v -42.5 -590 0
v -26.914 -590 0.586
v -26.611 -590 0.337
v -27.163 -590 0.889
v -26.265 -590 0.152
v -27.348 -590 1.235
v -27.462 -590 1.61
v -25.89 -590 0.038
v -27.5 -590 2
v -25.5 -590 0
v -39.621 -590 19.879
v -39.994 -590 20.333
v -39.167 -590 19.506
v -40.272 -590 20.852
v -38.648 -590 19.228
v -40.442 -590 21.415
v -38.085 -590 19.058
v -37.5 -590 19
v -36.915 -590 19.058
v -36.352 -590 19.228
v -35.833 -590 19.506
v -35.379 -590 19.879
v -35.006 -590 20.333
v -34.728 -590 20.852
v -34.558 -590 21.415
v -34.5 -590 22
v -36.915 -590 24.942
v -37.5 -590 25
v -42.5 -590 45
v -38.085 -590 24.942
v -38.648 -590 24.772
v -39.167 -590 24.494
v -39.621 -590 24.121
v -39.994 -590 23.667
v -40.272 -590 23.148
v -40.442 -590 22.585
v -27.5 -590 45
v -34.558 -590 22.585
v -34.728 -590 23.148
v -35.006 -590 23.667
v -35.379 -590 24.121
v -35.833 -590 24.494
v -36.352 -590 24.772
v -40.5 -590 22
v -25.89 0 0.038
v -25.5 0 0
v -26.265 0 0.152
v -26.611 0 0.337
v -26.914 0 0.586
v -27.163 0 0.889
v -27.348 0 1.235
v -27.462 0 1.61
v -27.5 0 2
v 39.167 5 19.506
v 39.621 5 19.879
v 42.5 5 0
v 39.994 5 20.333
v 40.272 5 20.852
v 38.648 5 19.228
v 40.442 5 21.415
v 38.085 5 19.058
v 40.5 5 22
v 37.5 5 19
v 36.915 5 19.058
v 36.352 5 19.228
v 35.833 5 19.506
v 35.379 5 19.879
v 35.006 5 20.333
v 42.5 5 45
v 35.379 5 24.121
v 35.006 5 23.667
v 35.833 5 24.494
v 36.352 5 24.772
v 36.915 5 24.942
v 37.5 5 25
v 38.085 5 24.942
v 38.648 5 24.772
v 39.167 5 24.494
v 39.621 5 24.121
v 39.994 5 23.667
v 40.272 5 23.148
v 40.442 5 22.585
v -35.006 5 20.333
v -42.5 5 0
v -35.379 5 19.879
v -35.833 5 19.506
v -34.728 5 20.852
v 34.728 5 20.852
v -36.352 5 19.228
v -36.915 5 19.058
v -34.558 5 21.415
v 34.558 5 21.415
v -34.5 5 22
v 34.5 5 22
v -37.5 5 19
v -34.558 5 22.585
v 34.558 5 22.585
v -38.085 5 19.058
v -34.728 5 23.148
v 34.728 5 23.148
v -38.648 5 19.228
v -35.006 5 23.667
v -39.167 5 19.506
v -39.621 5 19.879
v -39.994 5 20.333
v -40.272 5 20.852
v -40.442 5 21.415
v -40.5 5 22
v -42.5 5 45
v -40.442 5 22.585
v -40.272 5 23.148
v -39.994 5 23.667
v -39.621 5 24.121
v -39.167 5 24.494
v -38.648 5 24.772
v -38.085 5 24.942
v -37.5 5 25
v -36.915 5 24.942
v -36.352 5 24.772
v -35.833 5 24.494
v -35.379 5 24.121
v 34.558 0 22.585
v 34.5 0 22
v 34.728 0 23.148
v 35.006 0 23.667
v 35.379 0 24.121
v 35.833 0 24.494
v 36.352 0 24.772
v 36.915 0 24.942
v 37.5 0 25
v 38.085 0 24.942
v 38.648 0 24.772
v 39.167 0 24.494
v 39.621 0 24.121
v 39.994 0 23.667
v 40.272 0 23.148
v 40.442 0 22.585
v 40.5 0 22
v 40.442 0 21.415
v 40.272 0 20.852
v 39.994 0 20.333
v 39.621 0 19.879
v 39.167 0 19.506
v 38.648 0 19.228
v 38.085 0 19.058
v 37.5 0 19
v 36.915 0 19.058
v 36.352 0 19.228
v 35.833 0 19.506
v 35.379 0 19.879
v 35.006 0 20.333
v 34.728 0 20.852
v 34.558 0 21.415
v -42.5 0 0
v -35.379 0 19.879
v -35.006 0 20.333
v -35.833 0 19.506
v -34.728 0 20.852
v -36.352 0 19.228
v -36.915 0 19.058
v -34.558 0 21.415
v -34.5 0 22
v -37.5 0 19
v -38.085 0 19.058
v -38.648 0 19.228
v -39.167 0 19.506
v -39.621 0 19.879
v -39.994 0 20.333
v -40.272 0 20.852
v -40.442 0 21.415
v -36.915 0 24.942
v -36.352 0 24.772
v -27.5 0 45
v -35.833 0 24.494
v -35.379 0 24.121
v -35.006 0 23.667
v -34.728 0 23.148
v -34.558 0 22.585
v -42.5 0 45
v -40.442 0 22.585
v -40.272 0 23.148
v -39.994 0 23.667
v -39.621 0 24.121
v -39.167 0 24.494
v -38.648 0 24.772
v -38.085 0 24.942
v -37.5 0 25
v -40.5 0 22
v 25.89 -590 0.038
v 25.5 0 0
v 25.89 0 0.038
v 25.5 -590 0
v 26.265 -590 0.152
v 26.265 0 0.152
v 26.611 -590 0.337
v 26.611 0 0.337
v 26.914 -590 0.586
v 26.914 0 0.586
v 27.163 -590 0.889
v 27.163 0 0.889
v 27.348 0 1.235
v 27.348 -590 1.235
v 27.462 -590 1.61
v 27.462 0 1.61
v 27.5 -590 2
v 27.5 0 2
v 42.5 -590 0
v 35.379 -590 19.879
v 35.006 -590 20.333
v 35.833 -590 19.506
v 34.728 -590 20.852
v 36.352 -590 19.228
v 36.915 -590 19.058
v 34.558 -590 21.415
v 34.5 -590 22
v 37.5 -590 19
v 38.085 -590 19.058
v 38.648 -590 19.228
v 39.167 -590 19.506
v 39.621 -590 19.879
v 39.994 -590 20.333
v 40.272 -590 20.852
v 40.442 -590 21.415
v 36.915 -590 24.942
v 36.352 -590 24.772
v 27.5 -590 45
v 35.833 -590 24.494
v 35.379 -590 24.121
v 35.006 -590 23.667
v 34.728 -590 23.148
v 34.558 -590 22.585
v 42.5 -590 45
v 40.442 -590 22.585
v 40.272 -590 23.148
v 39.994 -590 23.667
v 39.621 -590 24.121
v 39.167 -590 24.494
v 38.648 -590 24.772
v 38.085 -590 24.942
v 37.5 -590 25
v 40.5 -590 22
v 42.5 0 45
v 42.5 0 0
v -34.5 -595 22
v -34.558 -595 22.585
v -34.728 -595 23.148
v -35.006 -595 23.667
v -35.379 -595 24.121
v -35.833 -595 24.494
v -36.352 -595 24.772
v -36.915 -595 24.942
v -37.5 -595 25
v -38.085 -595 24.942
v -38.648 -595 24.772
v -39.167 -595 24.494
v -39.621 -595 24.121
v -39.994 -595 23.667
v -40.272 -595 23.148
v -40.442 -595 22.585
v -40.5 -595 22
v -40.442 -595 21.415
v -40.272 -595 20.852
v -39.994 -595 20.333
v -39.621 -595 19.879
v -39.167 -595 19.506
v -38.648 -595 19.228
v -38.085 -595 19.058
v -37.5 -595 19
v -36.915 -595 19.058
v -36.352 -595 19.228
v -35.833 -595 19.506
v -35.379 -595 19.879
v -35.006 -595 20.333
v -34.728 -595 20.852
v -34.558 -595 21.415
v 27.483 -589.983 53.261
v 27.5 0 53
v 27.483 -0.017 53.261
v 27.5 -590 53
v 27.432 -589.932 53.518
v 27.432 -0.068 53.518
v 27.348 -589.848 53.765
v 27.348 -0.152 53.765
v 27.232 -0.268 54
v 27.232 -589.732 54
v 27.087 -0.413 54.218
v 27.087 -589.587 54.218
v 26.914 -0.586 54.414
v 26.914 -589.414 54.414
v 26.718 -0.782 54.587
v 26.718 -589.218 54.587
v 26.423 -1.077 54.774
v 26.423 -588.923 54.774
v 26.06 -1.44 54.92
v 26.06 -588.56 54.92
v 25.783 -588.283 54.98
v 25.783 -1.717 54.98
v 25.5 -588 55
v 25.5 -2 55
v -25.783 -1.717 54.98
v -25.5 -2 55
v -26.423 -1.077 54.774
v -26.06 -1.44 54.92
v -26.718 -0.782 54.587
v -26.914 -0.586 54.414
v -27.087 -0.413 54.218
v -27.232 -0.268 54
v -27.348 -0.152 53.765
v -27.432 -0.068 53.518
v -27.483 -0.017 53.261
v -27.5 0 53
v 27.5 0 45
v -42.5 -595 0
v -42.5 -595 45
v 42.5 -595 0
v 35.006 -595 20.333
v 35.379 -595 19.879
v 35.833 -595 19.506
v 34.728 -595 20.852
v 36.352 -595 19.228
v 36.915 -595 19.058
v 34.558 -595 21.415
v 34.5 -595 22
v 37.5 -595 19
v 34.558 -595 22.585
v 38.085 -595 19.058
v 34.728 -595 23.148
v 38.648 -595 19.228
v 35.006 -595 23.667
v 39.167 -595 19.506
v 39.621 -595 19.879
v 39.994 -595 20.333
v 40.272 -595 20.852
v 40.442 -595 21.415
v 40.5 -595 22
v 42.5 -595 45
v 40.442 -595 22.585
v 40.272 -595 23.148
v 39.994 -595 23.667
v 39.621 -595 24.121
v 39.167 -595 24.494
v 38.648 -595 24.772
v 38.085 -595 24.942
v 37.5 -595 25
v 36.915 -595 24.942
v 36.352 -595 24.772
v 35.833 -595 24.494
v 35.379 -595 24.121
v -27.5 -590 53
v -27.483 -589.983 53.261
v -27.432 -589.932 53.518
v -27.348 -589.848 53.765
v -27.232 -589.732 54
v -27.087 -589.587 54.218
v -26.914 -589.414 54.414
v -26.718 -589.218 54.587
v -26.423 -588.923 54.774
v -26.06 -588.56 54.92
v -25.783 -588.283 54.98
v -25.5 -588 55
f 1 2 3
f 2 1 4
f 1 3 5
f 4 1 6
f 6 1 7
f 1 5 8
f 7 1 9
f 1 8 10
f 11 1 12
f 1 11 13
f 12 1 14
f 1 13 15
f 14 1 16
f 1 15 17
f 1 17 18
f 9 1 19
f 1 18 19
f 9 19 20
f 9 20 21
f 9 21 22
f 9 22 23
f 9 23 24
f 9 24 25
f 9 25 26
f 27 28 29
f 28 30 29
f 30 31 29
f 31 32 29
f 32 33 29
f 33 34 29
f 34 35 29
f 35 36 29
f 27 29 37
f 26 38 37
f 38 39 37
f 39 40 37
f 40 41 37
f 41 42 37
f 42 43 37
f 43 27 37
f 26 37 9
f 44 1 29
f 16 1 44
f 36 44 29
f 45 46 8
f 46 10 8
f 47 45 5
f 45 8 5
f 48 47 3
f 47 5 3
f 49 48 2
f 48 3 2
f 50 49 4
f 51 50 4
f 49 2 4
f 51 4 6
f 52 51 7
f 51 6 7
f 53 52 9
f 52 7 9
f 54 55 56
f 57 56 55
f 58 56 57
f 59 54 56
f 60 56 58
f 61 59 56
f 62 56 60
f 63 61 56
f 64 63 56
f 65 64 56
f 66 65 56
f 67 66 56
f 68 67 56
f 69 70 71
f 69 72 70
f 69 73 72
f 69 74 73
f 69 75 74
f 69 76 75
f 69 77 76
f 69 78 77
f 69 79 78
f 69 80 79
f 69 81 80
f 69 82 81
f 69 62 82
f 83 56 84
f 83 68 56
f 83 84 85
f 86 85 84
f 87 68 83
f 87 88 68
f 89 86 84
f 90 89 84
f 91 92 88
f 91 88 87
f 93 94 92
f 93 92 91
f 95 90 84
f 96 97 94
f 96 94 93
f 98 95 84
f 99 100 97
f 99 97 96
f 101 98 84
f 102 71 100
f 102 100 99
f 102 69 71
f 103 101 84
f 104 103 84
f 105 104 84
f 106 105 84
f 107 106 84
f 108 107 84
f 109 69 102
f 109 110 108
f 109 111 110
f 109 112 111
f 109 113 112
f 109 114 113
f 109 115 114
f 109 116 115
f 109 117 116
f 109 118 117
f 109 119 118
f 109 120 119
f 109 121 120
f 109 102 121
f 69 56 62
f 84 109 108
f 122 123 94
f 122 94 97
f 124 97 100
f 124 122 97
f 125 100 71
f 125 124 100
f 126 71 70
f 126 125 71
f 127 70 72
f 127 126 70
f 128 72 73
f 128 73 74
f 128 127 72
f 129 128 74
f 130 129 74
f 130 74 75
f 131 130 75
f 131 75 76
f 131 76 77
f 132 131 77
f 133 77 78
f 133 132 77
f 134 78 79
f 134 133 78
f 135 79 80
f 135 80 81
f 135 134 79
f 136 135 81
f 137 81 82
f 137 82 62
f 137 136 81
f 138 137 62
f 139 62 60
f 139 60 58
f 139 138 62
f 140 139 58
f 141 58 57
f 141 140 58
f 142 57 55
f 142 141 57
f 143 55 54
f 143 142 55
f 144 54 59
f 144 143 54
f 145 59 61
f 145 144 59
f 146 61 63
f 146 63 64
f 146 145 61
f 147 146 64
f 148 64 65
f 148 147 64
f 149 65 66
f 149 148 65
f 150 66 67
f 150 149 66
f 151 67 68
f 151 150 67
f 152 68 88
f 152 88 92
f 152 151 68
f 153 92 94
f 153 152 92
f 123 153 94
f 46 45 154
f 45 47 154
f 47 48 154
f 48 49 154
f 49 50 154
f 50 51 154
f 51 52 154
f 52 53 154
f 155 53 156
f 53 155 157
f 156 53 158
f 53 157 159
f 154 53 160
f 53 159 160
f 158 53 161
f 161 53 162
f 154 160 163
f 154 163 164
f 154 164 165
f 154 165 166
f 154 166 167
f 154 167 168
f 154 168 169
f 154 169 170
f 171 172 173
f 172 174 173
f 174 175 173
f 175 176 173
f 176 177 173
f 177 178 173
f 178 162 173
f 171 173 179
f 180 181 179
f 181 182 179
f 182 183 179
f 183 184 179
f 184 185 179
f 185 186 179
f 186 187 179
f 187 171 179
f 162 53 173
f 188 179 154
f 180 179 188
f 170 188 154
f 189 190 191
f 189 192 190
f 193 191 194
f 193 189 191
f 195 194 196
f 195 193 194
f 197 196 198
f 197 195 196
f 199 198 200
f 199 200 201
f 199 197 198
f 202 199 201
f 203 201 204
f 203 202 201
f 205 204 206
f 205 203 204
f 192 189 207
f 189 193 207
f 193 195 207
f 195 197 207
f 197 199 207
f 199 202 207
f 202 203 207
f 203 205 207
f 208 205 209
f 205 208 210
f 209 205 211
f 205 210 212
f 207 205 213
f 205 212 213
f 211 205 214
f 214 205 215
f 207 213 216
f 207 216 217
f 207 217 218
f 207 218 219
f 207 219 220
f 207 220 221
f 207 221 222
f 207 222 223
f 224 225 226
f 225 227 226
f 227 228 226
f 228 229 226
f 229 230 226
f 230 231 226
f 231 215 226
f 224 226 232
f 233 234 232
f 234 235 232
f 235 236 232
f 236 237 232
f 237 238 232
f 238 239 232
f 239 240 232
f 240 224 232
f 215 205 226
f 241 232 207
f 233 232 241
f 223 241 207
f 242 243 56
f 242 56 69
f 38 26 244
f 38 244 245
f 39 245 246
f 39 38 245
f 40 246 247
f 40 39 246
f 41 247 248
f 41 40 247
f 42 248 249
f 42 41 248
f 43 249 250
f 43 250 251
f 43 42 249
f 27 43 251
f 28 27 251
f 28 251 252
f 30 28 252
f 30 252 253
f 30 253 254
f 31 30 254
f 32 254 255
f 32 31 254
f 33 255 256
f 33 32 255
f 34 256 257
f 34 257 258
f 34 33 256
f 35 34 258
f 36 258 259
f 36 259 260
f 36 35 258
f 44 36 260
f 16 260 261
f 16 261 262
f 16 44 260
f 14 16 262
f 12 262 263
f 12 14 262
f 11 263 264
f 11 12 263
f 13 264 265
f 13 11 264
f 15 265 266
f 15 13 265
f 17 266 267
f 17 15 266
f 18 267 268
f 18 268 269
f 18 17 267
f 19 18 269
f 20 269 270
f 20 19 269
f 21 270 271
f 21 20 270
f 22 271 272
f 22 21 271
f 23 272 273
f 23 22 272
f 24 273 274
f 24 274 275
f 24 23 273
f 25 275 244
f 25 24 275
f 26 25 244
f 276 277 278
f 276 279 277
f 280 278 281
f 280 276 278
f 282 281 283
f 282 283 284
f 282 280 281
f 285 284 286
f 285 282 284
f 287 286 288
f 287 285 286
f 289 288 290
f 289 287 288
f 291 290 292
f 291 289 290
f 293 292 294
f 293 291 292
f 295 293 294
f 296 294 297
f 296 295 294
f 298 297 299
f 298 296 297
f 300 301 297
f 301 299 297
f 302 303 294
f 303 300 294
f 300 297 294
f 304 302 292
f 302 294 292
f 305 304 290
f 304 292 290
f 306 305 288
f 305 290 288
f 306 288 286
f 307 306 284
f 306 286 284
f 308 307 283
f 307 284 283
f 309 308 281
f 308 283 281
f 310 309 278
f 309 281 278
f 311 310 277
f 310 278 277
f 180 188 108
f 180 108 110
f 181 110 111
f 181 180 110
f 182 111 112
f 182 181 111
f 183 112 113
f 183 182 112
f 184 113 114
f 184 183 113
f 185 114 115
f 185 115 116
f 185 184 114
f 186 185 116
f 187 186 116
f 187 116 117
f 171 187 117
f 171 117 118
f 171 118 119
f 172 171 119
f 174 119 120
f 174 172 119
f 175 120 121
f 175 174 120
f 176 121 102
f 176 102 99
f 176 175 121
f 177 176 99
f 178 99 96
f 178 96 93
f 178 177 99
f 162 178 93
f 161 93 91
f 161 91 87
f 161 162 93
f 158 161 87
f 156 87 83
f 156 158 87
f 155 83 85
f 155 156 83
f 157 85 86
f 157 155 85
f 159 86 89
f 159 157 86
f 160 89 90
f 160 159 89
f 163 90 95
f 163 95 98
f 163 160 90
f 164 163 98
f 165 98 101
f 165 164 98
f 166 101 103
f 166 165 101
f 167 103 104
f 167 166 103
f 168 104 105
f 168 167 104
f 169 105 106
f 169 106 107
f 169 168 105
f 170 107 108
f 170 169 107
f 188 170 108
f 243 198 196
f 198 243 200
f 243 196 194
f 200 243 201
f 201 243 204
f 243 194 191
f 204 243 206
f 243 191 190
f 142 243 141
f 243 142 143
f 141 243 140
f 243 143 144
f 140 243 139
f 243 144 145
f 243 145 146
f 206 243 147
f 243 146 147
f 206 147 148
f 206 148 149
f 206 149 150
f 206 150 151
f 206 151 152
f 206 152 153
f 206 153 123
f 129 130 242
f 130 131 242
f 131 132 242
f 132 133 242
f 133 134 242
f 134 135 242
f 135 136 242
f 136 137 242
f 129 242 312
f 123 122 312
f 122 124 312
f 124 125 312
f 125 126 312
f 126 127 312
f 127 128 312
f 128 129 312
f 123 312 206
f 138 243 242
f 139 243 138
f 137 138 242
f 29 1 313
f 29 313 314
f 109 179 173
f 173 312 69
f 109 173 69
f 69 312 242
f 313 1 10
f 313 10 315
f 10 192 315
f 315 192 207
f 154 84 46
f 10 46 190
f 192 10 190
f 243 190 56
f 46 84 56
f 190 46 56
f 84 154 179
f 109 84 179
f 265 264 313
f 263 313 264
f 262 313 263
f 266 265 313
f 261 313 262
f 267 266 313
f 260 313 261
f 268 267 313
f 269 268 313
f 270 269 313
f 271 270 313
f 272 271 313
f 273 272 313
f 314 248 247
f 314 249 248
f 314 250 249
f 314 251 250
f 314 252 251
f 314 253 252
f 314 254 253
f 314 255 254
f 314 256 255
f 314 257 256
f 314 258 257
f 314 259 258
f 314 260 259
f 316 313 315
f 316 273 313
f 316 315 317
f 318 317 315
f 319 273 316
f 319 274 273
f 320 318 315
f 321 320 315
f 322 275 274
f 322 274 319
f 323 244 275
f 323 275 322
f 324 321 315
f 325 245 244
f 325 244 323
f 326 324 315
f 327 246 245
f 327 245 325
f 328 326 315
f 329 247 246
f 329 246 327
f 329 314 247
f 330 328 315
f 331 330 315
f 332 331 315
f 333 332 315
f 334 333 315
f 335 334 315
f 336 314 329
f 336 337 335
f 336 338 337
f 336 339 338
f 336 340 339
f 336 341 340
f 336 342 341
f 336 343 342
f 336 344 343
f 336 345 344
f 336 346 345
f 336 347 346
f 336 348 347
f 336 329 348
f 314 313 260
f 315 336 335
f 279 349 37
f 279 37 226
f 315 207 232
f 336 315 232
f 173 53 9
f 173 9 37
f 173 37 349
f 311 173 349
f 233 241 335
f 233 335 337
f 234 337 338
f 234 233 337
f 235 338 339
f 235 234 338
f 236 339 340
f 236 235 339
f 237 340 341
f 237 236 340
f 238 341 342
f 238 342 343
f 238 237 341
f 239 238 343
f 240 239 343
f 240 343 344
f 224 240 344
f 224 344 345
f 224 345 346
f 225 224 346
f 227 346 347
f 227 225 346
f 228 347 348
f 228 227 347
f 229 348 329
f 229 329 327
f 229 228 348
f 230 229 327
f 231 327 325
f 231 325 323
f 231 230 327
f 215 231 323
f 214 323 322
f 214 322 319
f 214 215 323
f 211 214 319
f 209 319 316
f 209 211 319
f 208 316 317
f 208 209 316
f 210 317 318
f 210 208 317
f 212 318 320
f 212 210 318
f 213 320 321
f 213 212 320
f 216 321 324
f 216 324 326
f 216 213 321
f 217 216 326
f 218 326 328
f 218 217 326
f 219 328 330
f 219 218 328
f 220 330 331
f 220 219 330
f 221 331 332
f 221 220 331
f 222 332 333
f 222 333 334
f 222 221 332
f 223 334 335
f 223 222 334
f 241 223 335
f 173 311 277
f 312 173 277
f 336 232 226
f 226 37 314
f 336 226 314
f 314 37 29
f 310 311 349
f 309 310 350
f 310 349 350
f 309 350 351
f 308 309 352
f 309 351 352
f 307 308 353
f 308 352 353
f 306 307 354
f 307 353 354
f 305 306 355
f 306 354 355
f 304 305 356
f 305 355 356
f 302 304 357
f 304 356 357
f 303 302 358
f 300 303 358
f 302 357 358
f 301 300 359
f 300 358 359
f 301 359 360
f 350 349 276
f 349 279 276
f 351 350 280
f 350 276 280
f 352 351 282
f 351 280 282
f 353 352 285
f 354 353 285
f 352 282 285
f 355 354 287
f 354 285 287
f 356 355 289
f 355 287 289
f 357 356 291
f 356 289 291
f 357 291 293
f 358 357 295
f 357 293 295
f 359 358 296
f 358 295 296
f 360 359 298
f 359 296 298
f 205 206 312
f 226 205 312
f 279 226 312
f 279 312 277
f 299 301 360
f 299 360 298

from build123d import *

# Parameters (mm, degrees)
F0_W     = 55
F0_H     = 55
F1_DEPTH = 590
F2_W     = 15
F2_H     = 45
F2_R     = 3
F2_W_2   = 55
F3_DEPTH = 5
F4_W     = 15
F4_H     = 45
F4_R     = 3
F4_W_2   = 55
F5_DEPTH = 5
F6_R     = 2


with BuildPart() as f1:
    # F0 (on Front) → F1 (new body)
    with BuildSketch(Plane.XZ):
        with Locations((0, 27.5)):
            Rectangle(F0_W, F0_H)
    extrude(amount=F1_DEPTH)

    # F2 (on face) → F3 (join)
    with BuildSketch(Plane(origin=(0, 0, 0), x_dir=(-1, 0, 0), z_dir=(0, 1, 0))):
        with Locations((-35, 22.5)):
            Rectangle(F2_W, F2_H)
        with Locations((-37.5, 22)):
            Circle(F2_R, mode=Mode.SUBTRACT)
        with Locations((0, 22.5)):
            Rectangle(F2_W_2, F2_H)
        with Locations((35, 22.5)):
            Rectangle(F2_W, F2_H)
        with Locations((37.5, 22)):
            Circle(F2_R, mode=Mode.SUBTRACT)
    extrude(amount=F3_DEPTH)

    # F4 (on face) → F5 (join)
    with BuildSketch(Plane.XZ.offset(590)):
        with Locations((-35, 22.5)):
            Rectangle(F4_W, F4_H)
        with Locations((-37.5, 22)):
            Circle(F4_R, mode=Mode.SUBTRACT)
        with Locations((0, 22.5)):
            Rectangle(F4_W_2, F4_H)
        with Locations((35, 22.5)):
            Rectangle(F4_W, F4_H)
        with Locations((37.5, 22)):
            Circle(F4_R, mode=Mode.SUBTRACT)
    extrude(amount=F5_DEPTH)

    # F6
    f6_edges = [f1.edges().sort_by_distance(p)[0] for p in [
        (27.5, -295, 55),
        (-27.5, -295, 55),
        (0, 0, 55),
        (0, -590, 55),
        (-27.5, -295, 0),
        (27.5, -295, 0),
    ]]
    fillet(f6_edges, radius=F6_R)


solid = f1.part
